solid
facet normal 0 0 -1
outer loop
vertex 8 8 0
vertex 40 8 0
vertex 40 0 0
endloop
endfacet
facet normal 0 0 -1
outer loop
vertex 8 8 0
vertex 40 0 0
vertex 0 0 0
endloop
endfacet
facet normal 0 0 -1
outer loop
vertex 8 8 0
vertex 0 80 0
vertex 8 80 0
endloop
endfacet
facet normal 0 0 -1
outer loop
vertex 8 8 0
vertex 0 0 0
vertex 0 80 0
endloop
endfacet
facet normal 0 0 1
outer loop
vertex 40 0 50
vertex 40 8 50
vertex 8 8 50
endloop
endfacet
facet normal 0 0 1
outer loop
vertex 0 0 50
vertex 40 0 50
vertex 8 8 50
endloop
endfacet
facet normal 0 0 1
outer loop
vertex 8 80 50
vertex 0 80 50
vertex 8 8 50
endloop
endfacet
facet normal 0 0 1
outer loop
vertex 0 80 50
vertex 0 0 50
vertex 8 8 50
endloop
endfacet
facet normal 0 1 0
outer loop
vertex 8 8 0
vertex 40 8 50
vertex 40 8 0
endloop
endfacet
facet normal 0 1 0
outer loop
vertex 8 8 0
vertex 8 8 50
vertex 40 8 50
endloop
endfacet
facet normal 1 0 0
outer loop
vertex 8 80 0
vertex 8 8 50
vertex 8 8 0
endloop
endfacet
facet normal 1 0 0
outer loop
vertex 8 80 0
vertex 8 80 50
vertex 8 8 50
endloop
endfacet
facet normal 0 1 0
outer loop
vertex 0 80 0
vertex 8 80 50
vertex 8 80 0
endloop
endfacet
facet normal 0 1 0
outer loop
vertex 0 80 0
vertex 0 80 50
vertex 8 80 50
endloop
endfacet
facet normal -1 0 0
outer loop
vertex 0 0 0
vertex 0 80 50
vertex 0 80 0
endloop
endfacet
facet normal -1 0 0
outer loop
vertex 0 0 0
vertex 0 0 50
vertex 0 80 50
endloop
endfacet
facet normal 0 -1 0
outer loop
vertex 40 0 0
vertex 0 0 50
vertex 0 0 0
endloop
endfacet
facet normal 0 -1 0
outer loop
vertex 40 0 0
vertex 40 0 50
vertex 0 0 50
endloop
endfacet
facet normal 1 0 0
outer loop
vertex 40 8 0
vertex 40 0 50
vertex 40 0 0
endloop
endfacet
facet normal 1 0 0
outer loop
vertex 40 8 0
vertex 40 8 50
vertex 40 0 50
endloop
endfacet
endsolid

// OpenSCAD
$fn = 32;

// ----------------------------------------------------------------------
// Structural section: angle 40 x 80 mm
// ----------------------------------------------------------------------

// --- parameters (mm) ---
sec_w = 40;               // leg width, X
sec_h = 80;               // leg height, Y
flange_t = 8;             // leg thickness
plate_t = 50;             // cut length, Z (extrusion height)

profile = [[0, 0], [40, 0], [40, 8], [8, 8], [8, 80], [0, 80]];  // primary outline, 6 points, counter clockwise

// --- the one profile operation ---
linear_extrude(height = plate_t) polygon(points = profile);
